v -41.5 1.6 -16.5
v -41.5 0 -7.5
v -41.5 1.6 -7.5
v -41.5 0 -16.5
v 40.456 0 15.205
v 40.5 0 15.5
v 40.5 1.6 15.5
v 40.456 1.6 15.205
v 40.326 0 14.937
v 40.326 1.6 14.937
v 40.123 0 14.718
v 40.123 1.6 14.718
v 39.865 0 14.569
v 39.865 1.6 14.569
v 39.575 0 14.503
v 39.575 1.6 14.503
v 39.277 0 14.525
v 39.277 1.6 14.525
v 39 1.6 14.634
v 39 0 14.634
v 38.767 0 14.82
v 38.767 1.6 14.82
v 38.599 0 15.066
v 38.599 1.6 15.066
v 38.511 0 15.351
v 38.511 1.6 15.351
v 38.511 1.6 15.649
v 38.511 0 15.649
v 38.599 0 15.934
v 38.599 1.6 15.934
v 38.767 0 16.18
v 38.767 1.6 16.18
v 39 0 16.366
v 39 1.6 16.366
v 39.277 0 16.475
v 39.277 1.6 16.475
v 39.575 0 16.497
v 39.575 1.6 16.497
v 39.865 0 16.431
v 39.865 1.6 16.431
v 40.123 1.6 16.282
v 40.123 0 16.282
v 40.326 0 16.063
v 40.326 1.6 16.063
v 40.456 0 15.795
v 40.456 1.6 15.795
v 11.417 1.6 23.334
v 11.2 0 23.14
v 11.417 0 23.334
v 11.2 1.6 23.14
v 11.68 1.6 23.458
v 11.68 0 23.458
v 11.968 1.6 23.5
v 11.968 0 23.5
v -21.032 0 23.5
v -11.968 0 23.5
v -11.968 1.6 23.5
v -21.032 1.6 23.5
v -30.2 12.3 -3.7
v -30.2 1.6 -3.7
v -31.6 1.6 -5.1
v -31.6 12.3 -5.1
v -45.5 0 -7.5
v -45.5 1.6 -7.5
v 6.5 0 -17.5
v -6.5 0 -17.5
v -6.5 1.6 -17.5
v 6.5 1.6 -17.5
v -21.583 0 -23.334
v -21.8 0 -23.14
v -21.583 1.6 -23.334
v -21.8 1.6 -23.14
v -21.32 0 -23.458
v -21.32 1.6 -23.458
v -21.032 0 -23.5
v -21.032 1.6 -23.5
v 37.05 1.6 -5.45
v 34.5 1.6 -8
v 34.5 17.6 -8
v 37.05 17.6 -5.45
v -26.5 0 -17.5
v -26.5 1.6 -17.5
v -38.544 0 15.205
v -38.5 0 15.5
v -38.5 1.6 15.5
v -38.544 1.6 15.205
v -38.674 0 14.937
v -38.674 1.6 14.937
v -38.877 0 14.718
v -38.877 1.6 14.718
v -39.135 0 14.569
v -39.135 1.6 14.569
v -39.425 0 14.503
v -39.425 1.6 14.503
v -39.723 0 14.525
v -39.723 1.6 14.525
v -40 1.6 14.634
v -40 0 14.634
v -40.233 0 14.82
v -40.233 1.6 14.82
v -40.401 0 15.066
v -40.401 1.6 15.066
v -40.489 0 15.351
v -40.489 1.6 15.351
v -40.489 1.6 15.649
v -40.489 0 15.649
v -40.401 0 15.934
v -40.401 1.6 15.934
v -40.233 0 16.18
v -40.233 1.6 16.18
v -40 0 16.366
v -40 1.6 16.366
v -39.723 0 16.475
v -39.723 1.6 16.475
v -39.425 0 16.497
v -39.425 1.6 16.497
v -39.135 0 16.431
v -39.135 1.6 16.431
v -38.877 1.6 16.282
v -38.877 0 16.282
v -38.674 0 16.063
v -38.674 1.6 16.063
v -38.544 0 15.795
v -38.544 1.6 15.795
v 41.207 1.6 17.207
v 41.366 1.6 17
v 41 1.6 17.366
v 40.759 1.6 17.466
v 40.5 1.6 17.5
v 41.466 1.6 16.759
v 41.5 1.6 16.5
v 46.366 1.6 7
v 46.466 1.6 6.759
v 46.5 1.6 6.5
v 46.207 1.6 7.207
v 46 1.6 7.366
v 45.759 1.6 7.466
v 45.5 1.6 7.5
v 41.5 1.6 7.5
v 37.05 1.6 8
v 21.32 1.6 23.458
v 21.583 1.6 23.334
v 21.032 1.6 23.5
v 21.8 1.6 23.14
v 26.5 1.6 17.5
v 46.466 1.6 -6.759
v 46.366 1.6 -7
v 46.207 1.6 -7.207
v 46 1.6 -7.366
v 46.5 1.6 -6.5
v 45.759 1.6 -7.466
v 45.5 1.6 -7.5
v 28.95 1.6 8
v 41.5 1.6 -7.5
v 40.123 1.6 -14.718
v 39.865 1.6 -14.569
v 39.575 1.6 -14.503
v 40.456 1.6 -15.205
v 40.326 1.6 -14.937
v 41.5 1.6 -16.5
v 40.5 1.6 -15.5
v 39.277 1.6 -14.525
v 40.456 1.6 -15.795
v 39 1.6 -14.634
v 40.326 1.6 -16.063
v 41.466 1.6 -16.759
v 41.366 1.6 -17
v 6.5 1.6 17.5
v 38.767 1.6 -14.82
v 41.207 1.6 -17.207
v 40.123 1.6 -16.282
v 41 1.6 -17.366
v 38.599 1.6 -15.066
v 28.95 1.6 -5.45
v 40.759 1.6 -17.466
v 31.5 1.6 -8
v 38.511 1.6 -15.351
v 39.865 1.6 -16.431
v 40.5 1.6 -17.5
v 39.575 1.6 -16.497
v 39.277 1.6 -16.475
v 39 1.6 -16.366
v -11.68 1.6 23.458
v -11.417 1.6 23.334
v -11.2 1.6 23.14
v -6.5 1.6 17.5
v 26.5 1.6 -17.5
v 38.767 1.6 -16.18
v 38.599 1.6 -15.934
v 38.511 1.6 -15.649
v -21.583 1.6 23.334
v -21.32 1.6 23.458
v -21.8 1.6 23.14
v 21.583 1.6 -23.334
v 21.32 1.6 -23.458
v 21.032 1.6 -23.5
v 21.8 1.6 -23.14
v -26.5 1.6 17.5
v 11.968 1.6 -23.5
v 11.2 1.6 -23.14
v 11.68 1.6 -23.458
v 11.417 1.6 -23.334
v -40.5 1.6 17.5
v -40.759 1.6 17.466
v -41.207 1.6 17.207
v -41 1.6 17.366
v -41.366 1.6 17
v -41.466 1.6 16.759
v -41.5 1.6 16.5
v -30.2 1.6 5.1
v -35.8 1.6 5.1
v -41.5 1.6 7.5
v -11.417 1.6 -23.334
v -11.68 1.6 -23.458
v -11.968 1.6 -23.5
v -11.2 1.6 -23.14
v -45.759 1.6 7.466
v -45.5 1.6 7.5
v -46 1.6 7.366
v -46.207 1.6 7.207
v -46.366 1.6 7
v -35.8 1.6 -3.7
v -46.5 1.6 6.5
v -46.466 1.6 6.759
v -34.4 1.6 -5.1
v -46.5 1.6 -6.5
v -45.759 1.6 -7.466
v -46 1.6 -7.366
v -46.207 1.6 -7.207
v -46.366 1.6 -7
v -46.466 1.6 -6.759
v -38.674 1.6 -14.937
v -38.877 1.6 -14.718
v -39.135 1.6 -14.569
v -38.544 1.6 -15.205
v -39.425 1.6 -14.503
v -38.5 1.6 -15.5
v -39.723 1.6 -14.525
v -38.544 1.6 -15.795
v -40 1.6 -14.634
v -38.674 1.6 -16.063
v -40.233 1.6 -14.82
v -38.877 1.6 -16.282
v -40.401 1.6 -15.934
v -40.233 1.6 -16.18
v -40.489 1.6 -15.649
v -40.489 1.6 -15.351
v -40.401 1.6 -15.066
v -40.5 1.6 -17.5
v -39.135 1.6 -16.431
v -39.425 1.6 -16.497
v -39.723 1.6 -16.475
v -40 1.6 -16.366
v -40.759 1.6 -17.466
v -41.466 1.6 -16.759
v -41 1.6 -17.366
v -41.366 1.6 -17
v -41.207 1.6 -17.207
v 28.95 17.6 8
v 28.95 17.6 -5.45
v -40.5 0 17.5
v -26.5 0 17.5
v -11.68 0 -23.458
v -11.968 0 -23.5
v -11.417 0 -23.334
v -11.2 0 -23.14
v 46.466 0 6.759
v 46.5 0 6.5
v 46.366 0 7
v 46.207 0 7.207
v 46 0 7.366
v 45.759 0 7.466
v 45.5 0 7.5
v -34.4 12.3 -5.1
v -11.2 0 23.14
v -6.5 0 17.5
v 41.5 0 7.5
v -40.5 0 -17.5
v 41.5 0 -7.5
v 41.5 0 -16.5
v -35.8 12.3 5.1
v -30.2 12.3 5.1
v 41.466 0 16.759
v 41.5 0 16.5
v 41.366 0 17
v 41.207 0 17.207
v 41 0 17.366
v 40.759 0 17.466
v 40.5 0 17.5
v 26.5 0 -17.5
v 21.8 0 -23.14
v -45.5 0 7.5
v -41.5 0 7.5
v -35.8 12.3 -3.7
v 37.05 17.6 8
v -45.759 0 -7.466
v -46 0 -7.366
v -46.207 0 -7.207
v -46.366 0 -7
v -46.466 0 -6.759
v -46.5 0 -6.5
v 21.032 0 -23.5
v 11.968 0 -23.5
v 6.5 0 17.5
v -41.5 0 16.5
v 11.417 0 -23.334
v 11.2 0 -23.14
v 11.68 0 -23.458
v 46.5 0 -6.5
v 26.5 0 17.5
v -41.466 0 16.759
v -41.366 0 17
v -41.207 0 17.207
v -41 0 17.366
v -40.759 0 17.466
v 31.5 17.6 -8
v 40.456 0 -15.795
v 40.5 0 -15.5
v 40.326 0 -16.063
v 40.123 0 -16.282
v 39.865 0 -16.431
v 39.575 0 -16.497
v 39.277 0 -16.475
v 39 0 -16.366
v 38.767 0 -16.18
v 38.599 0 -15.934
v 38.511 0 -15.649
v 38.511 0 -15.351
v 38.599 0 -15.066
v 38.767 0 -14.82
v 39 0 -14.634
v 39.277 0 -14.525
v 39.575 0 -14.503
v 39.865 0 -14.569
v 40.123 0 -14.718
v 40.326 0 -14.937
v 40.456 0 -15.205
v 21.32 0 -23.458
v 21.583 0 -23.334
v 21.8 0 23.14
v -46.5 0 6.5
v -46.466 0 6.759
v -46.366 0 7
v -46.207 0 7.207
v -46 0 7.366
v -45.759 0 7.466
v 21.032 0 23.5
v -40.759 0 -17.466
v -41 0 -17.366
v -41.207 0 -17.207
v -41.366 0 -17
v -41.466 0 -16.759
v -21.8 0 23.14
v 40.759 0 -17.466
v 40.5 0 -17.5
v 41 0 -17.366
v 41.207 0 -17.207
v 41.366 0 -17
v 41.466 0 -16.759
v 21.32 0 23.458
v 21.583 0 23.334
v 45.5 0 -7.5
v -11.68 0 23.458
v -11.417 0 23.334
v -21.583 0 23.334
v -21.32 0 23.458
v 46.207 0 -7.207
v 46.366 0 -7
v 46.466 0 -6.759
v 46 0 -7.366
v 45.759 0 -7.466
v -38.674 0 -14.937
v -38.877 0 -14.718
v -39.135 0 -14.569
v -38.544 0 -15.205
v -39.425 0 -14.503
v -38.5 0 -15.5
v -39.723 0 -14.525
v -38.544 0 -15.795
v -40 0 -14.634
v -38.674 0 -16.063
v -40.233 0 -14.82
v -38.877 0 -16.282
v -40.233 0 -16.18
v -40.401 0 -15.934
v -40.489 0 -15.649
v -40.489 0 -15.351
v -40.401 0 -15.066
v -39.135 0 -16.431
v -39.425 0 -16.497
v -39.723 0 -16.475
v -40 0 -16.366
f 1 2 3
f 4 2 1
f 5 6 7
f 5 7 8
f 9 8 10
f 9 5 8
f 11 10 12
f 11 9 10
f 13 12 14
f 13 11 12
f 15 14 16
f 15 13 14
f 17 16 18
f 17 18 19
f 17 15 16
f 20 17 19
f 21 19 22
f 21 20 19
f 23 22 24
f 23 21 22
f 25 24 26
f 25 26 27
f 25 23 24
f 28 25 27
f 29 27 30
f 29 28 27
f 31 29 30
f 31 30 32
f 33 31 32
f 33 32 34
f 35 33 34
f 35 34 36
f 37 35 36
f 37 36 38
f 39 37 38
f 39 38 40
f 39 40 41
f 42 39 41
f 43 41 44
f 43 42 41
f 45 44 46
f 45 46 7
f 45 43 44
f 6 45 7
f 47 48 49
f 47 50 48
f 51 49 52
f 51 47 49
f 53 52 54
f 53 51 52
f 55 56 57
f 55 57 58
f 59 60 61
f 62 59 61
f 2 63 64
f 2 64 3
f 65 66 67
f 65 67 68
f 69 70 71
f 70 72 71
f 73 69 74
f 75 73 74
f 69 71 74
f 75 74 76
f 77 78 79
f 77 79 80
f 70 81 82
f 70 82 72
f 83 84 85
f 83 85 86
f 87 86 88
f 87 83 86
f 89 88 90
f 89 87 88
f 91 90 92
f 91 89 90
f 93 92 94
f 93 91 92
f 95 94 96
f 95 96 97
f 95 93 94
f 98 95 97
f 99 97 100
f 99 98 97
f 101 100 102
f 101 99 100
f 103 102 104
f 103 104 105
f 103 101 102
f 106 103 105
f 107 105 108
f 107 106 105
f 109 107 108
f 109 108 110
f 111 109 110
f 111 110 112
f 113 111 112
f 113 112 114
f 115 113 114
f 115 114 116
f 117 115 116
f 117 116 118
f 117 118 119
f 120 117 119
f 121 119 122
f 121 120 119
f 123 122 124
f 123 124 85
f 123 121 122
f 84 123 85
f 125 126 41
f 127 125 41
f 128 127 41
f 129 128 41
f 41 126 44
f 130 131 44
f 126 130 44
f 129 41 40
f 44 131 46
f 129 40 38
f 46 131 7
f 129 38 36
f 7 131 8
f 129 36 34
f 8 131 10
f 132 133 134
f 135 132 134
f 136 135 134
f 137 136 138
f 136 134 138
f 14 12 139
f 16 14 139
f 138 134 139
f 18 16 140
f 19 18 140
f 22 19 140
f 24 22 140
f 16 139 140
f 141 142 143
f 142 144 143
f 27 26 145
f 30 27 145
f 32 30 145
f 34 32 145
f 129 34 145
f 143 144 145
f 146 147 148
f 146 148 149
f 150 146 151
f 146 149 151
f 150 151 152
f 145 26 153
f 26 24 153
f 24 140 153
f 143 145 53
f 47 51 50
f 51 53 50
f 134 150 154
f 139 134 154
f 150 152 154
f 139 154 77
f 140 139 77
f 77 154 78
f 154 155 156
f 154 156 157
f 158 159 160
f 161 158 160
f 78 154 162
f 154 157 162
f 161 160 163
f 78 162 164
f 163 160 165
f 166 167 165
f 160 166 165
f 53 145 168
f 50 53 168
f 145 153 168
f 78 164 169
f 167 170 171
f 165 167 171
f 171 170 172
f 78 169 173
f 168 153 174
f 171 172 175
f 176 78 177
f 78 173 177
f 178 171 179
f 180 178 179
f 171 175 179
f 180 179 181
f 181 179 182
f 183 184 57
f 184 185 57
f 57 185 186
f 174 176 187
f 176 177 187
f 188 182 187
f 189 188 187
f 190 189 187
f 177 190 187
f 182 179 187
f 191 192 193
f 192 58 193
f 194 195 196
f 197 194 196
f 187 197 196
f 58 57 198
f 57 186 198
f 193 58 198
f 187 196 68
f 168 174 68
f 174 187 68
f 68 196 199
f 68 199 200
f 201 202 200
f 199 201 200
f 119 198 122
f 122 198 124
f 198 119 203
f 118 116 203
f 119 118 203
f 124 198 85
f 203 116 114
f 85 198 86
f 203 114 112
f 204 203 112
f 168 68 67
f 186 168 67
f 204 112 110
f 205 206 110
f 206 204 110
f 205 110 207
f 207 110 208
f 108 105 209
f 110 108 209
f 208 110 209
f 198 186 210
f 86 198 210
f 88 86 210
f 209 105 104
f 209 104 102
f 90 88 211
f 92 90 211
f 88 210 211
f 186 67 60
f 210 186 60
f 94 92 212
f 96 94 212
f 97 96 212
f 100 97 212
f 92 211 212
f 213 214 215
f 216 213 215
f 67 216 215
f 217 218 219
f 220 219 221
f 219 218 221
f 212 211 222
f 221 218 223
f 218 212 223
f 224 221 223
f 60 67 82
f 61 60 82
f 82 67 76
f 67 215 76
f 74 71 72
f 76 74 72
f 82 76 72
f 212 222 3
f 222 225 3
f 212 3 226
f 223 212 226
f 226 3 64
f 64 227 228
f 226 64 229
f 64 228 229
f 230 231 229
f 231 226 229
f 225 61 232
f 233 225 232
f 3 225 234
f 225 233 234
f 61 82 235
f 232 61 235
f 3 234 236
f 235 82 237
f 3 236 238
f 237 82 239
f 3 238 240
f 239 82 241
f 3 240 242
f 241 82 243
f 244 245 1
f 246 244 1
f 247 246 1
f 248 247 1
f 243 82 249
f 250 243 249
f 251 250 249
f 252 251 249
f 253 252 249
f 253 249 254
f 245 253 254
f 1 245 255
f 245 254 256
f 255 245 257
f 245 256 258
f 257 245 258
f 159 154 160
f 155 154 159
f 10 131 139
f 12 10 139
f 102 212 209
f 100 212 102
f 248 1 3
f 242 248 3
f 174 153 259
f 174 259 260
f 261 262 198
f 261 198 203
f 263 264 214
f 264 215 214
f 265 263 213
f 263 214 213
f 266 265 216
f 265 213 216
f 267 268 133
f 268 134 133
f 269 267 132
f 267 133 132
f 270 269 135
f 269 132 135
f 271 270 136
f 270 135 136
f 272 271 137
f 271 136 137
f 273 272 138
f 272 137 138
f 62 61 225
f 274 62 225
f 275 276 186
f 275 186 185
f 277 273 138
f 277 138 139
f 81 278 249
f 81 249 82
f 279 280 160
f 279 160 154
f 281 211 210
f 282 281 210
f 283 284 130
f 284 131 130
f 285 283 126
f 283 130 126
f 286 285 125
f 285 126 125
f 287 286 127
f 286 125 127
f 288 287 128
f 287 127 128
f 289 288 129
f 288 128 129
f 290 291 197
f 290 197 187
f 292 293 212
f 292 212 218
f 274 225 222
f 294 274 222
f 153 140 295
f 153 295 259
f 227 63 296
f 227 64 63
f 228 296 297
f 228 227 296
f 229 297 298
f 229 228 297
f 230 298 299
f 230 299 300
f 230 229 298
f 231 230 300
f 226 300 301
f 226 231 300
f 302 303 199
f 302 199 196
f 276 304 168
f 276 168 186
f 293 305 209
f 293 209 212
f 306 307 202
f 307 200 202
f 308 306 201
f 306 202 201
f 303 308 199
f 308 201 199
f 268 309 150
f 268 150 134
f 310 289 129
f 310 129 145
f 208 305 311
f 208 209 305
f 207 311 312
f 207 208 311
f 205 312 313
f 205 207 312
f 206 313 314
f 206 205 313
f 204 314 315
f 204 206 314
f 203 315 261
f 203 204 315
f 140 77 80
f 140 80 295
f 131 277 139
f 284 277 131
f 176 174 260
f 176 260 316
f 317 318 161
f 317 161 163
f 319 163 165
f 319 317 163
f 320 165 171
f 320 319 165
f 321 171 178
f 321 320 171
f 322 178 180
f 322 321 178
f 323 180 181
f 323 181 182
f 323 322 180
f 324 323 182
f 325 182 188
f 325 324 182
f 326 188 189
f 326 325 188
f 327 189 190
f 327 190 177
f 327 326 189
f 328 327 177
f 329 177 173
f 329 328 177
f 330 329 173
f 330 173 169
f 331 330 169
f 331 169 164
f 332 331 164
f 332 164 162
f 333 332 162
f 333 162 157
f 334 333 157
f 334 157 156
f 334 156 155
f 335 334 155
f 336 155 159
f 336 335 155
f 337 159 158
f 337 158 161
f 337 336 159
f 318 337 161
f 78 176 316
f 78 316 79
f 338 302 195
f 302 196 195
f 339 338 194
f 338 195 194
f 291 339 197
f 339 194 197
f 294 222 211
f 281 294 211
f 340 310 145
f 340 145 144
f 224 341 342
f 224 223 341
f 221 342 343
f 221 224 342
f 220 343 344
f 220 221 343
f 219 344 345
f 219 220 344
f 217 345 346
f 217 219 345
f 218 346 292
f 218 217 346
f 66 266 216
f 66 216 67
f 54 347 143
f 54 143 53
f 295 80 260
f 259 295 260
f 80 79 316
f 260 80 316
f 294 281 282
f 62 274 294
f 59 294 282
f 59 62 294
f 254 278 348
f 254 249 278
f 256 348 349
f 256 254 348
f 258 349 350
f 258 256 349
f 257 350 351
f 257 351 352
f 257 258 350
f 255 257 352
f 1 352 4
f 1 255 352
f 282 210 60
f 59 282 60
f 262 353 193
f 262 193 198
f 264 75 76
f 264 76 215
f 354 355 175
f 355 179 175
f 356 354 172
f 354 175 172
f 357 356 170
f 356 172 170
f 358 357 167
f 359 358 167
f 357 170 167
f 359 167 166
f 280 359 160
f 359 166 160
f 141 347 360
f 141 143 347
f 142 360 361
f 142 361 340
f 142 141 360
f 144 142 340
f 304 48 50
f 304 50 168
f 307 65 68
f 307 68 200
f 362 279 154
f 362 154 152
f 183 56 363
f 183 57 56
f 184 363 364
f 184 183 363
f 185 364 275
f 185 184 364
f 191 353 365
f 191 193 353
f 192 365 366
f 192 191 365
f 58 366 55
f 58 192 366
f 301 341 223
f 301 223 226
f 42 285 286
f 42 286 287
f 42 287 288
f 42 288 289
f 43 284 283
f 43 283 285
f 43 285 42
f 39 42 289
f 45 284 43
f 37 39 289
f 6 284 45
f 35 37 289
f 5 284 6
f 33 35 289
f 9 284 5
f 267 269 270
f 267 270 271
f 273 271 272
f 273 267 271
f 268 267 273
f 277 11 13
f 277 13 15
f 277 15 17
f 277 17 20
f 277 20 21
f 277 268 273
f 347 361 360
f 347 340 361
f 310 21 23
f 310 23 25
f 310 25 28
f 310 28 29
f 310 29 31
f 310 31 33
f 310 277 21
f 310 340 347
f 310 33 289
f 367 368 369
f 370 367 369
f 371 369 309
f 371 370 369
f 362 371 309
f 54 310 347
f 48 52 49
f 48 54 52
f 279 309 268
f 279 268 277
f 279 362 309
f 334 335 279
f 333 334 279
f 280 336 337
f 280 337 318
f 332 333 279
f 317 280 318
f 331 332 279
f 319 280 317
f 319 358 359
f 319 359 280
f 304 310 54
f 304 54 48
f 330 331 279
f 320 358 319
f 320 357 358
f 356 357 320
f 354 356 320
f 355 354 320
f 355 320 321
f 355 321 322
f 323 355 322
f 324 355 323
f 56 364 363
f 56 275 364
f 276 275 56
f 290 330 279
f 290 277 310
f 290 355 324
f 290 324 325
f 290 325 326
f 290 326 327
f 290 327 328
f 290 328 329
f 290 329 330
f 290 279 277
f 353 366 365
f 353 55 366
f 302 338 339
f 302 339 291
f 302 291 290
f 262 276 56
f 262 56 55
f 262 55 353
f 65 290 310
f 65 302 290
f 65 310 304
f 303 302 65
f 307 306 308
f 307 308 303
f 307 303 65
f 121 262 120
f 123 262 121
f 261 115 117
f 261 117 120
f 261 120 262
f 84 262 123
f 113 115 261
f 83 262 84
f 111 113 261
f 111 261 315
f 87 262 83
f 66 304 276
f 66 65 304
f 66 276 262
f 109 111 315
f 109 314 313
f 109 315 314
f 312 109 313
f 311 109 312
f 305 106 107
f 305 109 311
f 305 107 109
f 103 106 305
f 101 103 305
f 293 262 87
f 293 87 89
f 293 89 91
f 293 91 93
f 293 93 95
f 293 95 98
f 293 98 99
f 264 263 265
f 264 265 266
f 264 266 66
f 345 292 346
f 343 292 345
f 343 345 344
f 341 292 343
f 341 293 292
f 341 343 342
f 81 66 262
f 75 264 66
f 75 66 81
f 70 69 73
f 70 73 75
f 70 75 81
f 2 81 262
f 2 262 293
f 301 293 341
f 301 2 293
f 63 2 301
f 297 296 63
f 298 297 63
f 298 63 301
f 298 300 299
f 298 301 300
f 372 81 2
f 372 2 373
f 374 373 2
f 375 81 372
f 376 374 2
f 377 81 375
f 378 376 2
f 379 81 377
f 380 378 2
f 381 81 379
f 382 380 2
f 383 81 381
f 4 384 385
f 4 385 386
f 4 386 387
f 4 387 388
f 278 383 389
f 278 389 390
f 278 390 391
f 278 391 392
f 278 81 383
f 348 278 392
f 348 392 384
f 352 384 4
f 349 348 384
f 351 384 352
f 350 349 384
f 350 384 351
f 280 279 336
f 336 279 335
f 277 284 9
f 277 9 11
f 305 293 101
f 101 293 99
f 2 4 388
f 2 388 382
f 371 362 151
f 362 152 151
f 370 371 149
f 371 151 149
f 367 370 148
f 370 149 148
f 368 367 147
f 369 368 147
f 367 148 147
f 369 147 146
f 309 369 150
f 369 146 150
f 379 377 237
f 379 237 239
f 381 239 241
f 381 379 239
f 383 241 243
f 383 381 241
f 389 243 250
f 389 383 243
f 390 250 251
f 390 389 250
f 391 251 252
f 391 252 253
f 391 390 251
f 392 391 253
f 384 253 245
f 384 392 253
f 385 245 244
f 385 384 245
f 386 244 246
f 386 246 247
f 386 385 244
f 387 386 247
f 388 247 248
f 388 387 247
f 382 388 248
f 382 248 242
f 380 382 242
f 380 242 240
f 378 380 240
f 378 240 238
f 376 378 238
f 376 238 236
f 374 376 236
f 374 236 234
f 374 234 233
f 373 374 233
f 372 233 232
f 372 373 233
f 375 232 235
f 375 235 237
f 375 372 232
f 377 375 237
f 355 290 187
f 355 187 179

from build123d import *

# Parameters (mm, degrees)
SKETCH_1_R = 1
PCB_DEPTH  = 1.6
XT60_DEPTH = 16
XT30_DEPTH = 10.7
FILLET_2_R = 1


with BuildPart() as part:
    # 草图1 → PCB (new body)
    with BuildSketch(Plane(origin=(0, 0, 0), x_dir=(1, 0, 0), z_dir=(0, 1, 0))):
        Polygon((-26.5, 17.5), (-21.5, 23.5), (-11.5, 23.5), (-6.5, 17.5), (6.5, 17.5), (11.5, 23.5), (21.5, 23.5), (26.5, 17.5), (41.5, 17.5), (41.5, 7.5), (46.5, 7.5), (46.5, -7.5), (41.5, -7.5), (41.5, -17.5), (26.5, -17.5), (21.5, -23.5), (11.5, -23.5), (6.5, -17.5), (-6.5, -17.5), (-11.5, -23.5), (-21.5, -23.5), (-26.5, -17.5), (-41.5, -17.5), (-41.5, -7.5), (-46.5, -7.5), (-46.5, 7.5), (-41.5, 7.5), (-41.5, 17.5), align=None)
        with Locations((-39.5, 15.5)):
            Circle(SKETCH_1_R, mode=Mode.SUBTRACT)
        with Locations((-39.5, -15.5)):
            Circle(SKETCH_1_R, mode=Mode.SUBTRACT)
        with Locations((39.5, -15.5)):
            Circle(SKETCH_1_R, mode=Mode.SUBTRACT)
        with Locations((39.5, 15.5)):
            Circle(SKETCH_1_R, mode=Mode.SUBTRACT)
    extrude(amount=PCB_DEPTH)

    # 草图3 → XT60 (add)
    with BuildSketch(Plane(origin=(0, 1.6, 0), x_dir=(1, 0, 0), z_dir=(0, 1, 0))):
        Polygon((28.95, 5.45), (31.5, 8), (34.5, 8), (37.05, 5.45), (37.05, -8), (28.95, -8), align=None)
    extrude(amount=XT60_DEPTH)

    # 草图4 → XT30 (add)
    with BuildSketch(Plane(origin=(0, 1.6, 0), x_dir=(1, 0, 0), z_dir=(0, 1, 0))):
        Polygon((-34.4, 5.1), (-35.8, 3.7), (-35.8, -5.1), (-30.2, -5.1), (-30.2, 3.7), (-31.6, 5.1), align=None)
    extrude(amount=XT30_DEPTH)

    # 圆角2
    fillet_2_edges = [part.edges().sort_by_distance(p)[0] for p in [
        (46.5, 0.8, -7.5),
        (46.5, 0.8, 7.5),
        (41.5, 0.8, 17.5),
        (21.5, 0.8, 23.5),
        (11.5, 0.8, 23.5),
        (-11.5, 0.8, 23.5),
        (-21.5, 0.8, 23.5),
        (-41.5, 0.8, 17.5),
        (-46.5, 0.8, 7.5),
        (-46.5, 0.8, -7.5),
        (-41.5, 0.8, -17.5),
        (-21.5, 0.8, -23.5),
        (-11.5, 0.8, -23.5),
        (11.5, 0.8, -23.5),
        (21.5, 0.8, -23.5),
        (41.5, 0.8, -17.5),
    ]]
    fillet(fillet_2_edges, radius=FILLET_2_R)


solid = part.part
